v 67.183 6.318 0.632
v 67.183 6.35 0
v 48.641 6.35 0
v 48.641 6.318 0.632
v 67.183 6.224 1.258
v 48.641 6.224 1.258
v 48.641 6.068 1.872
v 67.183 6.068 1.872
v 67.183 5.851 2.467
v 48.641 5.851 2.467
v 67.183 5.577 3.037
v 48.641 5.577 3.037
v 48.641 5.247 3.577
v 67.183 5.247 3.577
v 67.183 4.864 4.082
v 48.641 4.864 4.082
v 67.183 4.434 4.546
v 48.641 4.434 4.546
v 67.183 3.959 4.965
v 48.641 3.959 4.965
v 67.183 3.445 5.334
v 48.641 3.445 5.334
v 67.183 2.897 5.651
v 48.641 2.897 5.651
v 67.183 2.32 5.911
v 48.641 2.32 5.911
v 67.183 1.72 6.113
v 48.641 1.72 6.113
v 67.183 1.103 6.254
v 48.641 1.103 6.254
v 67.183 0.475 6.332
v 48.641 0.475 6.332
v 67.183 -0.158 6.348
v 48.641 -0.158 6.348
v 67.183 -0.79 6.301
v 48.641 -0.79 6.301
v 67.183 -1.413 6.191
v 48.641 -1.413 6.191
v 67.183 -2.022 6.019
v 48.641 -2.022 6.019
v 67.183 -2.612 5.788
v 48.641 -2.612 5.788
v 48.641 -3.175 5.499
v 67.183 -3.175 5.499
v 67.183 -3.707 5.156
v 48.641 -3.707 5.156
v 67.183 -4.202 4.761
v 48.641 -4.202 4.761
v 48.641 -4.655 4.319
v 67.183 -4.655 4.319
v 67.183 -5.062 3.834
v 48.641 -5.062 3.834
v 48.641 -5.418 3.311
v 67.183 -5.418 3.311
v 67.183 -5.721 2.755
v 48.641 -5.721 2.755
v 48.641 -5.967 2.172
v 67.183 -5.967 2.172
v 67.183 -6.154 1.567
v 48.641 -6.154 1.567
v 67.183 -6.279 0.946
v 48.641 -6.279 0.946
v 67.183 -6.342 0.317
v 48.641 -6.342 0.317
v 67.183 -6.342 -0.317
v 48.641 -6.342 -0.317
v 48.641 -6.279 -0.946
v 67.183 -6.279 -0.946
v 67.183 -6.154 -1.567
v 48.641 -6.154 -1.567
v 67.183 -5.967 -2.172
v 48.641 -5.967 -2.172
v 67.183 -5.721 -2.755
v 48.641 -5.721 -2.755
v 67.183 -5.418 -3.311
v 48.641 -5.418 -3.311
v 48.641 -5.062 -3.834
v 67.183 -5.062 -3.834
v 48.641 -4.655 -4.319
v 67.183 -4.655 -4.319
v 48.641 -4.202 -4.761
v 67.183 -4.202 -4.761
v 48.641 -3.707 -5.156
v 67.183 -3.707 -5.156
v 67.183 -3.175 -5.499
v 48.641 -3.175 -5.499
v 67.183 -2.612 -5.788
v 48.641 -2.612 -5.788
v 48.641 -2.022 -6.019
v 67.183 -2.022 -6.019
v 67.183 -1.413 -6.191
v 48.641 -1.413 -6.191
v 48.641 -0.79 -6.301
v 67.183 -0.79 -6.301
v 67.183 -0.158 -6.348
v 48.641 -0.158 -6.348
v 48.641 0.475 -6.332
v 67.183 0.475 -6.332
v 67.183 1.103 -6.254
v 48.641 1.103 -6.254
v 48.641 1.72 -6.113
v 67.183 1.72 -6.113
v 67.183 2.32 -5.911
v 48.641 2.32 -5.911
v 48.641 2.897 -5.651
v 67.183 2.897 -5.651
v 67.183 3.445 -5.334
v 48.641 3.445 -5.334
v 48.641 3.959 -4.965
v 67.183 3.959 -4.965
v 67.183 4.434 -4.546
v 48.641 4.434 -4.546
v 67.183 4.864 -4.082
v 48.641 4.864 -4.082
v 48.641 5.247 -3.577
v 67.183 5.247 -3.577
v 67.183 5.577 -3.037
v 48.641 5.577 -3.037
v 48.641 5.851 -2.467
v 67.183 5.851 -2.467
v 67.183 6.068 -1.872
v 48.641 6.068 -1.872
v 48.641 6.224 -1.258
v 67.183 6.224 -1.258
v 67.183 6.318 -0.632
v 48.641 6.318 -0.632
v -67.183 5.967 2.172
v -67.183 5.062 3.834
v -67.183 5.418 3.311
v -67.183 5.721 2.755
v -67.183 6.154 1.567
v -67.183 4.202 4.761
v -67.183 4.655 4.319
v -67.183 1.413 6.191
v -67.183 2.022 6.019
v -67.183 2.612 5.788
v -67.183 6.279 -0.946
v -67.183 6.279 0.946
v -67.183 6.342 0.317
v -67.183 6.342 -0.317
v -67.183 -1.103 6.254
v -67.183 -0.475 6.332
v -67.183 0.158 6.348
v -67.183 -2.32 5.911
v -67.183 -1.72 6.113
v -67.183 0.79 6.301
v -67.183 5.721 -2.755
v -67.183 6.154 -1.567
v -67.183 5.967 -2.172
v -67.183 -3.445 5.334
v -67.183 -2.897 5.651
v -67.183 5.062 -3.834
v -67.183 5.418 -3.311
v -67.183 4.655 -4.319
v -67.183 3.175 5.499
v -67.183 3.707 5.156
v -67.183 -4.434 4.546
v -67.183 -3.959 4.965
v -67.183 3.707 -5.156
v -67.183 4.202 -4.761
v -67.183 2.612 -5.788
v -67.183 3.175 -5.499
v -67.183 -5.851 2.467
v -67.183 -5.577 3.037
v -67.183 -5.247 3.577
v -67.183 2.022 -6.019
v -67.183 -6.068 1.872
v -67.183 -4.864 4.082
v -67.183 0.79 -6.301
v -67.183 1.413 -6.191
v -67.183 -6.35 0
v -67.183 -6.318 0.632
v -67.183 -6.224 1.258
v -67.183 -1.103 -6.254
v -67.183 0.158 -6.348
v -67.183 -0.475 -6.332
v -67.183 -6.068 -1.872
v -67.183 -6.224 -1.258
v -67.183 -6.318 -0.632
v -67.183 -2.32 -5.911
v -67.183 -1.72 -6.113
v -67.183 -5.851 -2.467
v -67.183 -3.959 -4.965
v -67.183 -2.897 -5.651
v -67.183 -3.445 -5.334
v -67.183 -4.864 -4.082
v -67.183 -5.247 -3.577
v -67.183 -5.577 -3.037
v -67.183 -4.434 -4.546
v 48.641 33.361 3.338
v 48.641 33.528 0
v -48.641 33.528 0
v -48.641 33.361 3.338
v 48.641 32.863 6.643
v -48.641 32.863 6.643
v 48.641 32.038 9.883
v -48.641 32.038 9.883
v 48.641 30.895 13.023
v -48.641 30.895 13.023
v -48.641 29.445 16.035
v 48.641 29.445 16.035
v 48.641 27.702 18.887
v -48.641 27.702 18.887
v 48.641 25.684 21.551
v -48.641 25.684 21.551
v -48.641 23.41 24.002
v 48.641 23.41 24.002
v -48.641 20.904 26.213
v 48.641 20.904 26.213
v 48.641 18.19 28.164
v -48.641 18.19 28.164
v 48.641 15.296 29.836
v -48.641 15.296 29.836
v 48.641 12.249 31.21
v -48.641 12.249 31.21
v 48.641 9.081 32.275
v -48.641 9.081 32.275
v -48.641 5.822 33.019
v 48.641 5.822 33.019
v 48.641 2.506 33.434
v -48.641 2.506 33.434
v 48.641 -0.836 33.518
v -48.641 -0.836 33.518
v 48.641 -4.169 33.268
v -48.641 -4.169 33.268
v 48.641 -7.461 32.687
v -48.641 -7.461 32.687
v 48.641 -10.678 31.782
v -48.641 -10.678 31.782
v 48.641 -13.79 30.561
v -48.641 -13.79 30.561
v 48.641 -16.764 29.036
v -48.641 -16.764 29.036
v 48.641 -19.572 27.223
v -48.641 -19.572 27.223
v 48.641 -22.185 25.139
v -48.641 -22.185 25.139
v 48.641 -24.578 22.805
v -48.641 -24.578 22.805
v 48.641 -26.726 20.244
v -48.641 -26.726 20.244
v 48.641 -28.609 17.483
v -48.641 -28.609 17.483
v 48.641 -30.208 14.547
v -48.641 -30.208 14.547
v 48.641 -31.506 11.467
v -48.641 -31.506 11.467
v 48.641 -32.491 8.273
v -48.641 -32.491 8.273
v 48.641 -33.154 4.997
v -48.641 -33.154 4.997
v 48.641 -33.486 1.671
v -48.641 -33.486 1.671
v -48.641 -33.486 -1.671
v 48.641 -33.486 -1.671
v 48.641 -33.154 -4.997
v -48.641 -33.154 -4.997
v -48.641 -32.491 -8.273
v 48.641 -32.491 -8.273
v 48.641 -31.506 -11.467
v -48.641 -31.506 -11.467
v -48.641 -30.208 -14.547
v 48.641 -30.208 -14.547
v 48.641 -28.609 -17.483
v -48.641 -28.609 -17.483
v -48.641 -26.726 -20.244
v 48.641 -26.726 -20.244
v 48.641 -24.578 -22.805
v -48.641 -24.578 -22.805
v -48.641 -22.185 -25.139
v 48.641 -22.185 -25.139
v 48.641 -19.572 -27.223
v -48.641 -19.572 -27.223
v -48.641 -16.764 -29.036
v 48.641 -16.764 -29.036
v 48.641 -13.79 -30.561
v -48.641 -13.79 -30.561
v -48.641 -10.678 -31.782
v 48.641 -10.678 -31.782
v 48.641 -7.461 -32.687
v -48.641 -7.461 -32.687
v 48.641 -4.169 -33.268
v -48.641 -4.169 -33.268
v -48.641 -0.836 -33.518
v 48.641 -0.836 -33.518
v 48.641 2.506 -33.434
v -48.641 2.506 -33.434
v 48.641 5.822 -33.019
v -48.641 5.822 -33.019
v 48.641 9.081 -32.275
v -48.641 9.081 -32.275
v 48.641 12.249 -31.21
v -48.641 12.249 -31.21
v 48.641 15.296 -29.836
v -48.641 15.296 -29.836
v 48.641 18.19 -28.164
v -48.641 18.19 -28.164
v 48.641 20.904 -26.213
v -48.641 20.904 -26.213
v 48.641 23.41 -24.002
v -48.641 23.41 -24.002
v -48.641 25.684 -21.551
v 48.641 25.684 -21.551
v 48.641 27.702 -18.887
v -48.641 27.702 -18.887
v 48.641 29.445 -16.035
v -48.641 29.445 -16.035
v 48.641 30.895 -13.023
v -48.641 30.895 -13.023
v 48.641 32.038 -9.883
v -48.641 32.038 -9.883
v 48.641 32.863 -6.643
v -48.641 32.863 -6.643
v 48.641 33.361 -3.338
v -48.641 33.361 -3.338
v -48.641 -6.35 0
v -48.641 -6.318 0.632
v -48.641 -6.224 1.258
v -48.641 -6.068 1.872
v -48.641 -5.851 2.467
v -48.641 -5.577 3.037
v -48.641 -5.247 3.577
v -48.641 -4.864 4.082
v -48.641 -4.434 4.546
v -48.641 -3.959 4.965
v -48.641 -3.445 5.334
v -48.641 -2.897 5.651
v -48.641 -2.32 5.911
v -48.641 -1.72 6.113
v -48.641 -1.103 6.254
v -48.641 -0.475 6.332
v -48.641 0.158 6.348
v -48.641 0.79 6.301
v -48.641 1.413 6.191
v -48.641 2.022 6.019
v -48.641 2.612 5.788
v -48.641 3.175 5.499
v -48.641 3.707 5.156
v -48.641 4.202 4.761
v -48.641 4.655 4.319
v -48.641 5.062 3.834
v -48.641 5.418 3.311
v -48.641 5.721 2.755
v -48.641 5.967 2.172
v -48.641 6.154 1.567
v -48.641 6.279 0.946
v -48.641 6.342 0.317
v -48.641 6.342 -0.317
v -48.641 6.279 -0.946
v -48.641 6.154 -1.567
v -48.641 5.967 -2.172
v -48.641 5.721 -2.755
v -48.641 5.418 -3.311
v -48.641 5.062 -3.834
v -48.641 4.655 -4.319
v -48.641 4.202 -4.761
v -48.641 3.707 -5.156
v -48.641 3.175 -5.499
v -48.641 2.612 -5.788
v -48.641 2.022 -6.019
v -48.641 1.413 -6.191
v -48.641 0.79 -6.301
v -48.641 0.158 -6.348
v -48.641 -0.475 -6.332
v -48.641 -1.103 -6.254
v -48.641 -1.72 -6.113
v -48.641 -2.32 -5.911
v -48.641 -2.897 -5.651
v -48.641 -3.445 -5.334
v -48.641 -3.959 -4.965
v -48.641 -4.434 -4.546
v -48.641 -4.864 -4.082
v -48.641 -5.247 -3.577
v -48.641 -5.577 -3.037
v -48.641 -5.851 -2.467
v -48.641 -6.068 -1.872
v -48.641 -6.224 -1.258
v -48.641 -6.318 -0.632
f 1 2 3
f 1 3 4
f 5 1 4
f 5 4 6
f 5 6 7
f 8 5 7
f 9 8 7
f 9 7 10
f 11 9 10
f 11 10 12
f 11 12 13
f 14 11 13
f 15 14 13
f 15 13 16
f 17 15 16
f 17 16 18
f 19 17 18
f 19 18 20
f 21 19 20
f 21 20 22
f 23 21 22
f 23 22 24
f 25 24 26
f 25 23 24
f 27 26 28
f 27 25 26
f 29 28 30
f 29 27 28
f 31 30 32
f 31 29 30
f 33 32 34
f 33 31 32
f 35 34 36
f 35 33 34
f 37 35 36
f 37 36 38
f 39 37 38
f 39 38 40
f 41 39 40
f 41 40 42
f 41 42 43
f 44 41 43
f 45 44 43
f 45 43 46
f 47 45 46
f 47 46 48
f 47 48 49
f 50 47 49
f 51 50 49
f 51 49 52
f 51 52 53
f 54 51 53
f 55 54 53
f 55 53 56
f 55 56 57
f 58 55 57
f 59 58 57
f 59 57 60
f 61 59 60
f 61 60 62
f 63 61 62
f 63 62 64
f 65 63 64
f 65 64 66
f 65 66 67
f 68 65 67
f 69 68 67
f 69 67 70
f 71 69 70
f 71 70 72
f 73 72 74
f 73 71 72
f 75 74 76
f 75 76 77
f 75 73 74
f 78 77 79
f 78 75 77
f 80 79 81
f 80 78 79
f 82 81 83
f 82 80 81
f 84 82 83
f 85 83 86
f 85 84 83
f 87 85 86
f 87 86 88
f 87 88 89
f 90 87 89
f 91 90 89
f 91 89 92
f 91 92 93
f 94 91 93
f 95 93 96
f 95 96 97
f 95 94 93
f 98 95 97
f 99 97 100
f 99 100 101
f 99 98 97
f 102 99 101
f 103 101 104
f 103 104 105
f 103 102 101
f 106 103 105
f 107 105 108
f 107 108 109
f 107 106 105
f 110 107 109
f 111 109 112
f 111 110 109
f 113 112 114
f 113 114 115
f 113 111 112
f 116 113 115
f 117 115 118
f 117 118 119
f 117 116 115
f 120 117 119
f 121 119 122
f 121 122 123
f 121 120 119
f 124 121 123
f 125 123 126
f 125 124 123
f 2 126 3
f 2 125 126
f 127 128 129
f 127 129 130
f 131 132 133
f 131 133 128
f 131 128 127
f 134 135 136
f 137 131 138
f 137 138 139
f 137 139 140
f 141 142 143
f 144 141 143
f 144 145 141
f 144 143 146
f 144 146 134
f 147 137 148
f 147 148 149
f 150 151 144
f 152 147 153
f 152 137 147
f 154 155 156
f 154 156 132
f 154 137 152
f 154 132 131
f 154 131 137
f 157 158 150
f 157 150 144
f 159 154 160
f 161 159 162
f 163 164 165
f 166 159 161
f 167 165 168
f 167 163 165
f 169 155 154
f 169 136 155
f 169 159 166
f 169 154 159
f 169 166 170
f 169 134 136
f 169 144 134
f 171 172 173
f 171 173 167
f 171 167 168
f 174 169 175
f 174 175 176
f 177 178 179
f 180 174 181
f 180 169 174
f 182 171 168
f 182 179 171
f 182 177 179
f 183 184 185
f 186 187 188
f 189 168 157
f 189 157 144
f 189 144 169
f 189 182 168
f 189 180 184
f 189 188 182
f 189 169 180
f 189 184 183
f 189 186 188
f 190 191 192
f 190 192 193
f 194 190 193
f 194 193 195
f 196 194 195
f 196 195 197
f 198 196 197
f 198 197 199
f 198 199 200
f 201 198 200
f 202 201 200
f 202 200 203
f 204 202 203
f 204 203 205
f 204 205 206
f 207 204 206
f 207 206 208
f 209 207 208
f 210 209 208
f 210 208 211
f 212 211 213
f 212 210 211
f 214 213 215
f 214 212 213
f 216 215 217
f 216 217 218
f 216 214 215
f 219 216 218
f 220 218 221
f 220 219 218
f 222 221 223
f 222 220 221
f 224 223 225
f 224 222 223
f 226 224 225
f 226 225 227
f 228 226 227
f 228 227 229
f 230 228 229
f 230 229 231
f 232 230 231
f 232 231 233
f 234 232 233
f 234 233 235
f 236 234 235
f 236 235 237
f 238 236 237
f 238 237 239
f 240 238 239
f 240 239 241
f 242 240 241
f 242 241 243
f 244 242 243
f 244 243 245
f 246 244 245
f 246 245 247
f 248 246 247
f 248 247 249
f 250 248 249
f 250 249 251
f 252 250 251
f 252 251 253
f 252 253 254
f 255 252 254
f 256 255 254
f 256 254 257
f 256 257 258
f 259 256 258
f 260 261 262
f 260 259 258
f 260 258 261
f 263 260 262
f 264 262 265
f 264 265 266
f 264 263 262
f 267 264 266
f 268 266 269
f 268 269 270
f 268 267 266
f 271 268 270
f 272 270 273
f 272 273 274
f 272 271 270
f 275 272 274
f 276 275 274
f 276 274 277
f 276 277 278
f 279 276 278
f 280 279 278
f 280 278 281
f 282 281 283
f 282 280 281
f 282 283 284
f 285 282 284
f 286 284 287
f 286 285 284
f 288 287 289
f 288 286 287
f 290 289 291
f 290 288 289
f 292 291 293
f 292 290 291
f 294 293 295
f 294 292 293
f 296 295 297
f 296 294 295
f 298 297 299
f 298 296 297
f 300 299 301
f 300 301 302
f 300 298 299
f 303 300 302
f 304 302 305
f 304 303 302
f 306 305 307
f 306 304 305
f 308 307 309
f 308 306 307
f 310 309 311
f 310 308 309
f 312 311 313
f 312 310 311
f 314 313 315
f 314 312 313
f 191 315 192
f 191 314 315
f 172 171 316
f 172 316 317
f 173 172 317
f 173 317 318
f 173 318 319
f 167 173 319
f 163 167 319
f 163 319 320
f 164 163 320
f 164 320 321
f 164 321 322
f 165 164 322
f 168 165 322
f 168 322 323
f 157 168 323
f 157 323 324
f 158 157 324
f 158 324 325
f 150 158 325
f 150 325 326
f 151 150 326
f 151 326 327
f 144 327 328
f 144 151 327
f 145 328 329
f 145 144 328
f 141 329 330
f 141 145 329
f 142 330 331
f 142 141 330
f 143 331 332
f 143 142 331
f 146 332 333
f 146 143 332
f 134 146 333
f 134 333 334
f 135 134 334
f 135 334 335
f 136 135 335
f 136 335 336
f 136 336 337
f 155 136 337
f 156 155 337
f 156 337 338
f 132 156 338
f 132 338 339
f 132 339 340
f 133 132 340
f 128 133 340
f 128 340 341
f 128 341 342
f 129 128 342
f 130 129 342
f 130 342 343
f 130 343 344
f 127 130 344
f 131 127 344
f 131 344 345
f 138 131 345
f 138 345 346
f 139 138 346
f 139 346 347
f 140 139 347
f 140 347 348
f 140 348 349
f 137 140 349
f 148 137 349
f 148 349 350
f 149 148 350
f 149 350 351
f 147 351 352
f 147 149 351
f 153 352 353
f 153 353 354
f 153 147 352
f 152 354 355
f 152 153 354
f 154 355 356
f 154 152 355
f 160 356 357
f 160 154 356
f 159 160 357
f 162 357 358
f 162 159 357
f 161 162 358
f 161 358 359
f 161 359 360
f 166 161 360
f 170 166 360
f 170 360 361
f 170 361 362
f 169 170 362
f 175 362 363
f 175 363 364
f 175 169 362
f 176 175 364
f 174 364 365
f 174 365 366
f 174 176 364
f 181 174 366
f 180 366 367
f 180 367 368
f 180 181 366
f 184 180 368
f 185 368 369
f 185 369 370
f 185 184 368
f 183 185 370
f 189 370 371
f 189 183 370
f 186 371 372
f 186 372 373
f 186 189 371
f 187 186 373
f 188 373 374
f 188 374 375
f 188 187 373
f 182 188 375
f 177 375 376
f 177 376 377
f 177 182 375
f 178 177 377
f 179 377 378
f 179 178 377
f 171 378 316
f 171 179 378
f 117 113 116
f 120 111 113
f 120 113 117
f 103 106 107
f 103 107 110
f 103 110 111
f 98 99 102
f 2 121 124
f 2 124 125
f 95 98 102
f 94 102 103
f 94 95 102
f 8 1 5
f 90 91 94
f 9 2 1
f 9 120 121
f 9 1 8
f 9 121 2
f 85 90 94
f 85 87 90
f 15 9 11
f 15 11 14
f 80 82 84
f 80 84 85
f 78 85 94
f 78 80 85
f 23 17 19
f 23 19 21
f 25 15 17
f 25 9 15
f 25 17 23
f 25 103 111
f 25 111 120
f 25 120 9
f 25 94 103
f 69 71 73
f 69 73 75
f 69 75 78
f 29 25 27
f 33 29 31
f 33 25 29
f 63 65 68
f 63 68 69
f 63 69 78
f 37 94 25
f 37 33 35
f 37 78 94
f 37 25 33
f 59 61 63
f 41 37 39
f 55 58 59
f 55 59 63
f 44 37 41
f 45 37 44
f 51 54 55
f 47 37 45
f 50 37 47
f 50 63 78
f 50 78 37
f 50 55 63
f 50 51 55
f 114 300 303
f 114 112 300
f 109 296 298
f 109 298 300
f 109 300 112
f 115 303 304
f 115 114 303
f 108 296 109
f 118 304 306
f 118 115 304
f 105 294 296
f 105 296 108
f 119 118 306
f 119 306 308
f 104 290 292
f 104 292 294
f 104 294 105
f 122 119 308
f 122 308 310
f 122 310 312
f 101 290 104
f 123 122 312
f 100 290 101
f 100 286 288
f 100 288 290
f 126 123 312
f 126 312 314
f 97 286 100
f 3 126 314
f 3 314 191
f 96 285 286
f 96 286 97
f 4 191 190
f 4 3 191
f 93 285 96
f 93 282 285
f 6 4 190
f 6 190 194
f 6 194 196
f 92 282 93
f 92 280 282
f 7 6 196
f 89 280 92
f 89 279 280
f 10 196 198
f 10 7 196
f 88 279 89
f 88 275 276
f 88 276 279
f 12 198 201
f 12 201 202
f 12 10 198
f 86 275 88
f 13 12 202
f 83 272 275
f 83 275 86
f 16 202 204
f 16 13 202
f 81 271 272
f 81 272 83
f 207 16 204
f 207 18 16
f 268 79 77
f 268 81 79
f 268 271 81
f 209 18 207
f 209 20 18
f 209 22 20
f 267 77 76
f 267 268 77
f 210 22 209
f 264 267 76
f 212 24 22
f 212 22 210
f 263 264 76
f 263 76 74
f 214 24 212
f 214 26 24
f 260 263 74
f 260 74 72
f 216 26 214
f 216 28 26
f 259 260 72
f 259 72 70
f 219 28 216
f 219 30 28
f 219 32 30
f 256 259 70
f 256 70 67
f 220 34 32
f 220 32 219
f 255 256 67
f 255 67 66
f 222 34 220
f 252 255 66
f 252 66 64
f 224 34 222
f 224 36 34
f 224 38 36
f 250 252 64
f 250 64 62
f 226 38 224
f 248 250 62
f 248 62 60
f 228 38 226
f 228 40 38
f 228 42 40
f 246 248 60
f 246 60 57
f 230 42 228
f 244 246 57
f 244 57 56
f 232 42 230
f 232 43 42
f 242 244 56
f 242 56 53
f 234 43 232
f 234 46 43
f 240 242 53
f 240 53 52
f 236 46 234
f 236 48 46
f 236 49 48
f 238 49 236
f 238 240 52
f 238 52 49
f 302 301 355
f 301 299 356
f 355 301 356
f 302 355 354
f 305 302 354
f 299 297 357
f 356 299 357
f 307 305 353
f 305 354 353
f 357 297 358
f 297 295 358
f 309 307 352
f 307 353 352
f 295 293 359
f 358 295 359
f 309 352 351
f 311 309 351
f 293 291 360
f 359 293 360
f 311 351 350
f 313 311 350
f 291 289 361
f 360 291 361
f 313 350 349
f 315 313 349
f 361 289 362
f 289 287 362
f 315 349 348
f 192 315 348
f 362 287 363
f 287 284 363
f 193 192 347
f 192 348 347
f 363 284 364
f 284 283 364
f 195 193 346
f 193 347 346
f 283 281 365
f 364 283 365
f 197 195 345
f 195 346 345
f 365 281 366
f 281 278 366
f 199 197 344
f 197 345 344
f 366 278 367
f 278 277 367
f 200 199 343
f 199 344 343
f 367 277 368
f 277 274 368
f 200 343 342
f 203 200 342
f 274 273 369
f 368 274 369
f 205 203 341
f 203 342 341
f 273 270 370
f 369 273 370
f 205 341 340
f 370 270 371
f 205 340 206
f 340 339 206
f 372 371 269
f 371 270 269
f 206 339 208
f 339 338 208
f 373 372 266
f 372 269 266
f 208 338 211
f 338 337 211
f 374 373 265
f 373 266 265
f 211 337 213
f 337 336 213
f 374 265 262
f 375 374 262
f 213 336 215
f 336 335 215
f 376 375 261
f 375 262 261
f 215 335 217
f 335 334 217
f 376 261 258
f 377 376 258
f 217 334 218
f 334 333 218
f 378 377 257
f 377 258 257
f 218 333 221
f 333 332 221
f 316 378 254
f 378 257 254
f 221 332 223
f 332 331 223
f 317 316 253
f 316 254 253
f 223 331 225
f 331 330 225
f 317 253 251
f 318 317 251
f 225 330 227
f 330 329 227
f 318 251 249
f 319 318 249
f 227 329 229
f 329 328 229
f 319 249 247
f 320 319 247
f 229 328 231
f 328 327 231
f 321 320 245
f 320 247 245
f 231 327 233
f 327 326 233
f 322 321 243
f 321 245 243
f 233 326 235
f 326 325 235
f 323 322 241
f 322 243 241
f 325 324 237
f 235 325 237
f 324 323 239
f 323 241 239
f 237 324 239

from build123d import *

# Parameters (mm, degrees)
SWEEP1_PROFILE_R = 33.528
SWEEP2_PROFILE_R = 6.35
SWEEP3_PROFILE_R = 6.35


with BuildPart() as part:
    # Sweep1: sweep along a path in Sketch1
    with BuildLine(Plane.XY) as sweep1_path:
        Line((-48.641, 0), (48.641, 0))
    # Sweep1 profile (on start of the path) → Sweep1 (sweep)
    with BuildSketch(Plane.YZ.offset(-48.641)):
        Circle(SWEEP1_PROFILE_R)
    sweep(path=sweep1_path.line)

    # Sweep2: sweep along a path in Sketch11
    with BuildLine(Plane.XY) as sweep2_path:
        Line((48.641, 0), (67.183, 0))
    # Sweep2 profile (on start of the path) → Sweep2 (sweep)
    with BuildSketch(Plane.YZ.offset(48.641)):
        Circle(SWEEP2_PROFILE_R)
    sweep(path=sweep2_path.line)

    # Sweep3: sweep along a path in Sketch30
    with BuildLine(Plane.XY) as sweep3_path:
        Line((-48.641, 0), (-67.183, 0))
    # Sweep3 profile (on start of the path) → Sweep3 (sweep)
    with BuildSketch(Plane(origin=(-48.641, 0, 0), x_dir=(0, -1, 0), z_dir=(-1, 0, 0))):
        Circle(SWEEP3_PROFILE_R)
    sweep(path=sweep3_path.line)


solid = part.part
